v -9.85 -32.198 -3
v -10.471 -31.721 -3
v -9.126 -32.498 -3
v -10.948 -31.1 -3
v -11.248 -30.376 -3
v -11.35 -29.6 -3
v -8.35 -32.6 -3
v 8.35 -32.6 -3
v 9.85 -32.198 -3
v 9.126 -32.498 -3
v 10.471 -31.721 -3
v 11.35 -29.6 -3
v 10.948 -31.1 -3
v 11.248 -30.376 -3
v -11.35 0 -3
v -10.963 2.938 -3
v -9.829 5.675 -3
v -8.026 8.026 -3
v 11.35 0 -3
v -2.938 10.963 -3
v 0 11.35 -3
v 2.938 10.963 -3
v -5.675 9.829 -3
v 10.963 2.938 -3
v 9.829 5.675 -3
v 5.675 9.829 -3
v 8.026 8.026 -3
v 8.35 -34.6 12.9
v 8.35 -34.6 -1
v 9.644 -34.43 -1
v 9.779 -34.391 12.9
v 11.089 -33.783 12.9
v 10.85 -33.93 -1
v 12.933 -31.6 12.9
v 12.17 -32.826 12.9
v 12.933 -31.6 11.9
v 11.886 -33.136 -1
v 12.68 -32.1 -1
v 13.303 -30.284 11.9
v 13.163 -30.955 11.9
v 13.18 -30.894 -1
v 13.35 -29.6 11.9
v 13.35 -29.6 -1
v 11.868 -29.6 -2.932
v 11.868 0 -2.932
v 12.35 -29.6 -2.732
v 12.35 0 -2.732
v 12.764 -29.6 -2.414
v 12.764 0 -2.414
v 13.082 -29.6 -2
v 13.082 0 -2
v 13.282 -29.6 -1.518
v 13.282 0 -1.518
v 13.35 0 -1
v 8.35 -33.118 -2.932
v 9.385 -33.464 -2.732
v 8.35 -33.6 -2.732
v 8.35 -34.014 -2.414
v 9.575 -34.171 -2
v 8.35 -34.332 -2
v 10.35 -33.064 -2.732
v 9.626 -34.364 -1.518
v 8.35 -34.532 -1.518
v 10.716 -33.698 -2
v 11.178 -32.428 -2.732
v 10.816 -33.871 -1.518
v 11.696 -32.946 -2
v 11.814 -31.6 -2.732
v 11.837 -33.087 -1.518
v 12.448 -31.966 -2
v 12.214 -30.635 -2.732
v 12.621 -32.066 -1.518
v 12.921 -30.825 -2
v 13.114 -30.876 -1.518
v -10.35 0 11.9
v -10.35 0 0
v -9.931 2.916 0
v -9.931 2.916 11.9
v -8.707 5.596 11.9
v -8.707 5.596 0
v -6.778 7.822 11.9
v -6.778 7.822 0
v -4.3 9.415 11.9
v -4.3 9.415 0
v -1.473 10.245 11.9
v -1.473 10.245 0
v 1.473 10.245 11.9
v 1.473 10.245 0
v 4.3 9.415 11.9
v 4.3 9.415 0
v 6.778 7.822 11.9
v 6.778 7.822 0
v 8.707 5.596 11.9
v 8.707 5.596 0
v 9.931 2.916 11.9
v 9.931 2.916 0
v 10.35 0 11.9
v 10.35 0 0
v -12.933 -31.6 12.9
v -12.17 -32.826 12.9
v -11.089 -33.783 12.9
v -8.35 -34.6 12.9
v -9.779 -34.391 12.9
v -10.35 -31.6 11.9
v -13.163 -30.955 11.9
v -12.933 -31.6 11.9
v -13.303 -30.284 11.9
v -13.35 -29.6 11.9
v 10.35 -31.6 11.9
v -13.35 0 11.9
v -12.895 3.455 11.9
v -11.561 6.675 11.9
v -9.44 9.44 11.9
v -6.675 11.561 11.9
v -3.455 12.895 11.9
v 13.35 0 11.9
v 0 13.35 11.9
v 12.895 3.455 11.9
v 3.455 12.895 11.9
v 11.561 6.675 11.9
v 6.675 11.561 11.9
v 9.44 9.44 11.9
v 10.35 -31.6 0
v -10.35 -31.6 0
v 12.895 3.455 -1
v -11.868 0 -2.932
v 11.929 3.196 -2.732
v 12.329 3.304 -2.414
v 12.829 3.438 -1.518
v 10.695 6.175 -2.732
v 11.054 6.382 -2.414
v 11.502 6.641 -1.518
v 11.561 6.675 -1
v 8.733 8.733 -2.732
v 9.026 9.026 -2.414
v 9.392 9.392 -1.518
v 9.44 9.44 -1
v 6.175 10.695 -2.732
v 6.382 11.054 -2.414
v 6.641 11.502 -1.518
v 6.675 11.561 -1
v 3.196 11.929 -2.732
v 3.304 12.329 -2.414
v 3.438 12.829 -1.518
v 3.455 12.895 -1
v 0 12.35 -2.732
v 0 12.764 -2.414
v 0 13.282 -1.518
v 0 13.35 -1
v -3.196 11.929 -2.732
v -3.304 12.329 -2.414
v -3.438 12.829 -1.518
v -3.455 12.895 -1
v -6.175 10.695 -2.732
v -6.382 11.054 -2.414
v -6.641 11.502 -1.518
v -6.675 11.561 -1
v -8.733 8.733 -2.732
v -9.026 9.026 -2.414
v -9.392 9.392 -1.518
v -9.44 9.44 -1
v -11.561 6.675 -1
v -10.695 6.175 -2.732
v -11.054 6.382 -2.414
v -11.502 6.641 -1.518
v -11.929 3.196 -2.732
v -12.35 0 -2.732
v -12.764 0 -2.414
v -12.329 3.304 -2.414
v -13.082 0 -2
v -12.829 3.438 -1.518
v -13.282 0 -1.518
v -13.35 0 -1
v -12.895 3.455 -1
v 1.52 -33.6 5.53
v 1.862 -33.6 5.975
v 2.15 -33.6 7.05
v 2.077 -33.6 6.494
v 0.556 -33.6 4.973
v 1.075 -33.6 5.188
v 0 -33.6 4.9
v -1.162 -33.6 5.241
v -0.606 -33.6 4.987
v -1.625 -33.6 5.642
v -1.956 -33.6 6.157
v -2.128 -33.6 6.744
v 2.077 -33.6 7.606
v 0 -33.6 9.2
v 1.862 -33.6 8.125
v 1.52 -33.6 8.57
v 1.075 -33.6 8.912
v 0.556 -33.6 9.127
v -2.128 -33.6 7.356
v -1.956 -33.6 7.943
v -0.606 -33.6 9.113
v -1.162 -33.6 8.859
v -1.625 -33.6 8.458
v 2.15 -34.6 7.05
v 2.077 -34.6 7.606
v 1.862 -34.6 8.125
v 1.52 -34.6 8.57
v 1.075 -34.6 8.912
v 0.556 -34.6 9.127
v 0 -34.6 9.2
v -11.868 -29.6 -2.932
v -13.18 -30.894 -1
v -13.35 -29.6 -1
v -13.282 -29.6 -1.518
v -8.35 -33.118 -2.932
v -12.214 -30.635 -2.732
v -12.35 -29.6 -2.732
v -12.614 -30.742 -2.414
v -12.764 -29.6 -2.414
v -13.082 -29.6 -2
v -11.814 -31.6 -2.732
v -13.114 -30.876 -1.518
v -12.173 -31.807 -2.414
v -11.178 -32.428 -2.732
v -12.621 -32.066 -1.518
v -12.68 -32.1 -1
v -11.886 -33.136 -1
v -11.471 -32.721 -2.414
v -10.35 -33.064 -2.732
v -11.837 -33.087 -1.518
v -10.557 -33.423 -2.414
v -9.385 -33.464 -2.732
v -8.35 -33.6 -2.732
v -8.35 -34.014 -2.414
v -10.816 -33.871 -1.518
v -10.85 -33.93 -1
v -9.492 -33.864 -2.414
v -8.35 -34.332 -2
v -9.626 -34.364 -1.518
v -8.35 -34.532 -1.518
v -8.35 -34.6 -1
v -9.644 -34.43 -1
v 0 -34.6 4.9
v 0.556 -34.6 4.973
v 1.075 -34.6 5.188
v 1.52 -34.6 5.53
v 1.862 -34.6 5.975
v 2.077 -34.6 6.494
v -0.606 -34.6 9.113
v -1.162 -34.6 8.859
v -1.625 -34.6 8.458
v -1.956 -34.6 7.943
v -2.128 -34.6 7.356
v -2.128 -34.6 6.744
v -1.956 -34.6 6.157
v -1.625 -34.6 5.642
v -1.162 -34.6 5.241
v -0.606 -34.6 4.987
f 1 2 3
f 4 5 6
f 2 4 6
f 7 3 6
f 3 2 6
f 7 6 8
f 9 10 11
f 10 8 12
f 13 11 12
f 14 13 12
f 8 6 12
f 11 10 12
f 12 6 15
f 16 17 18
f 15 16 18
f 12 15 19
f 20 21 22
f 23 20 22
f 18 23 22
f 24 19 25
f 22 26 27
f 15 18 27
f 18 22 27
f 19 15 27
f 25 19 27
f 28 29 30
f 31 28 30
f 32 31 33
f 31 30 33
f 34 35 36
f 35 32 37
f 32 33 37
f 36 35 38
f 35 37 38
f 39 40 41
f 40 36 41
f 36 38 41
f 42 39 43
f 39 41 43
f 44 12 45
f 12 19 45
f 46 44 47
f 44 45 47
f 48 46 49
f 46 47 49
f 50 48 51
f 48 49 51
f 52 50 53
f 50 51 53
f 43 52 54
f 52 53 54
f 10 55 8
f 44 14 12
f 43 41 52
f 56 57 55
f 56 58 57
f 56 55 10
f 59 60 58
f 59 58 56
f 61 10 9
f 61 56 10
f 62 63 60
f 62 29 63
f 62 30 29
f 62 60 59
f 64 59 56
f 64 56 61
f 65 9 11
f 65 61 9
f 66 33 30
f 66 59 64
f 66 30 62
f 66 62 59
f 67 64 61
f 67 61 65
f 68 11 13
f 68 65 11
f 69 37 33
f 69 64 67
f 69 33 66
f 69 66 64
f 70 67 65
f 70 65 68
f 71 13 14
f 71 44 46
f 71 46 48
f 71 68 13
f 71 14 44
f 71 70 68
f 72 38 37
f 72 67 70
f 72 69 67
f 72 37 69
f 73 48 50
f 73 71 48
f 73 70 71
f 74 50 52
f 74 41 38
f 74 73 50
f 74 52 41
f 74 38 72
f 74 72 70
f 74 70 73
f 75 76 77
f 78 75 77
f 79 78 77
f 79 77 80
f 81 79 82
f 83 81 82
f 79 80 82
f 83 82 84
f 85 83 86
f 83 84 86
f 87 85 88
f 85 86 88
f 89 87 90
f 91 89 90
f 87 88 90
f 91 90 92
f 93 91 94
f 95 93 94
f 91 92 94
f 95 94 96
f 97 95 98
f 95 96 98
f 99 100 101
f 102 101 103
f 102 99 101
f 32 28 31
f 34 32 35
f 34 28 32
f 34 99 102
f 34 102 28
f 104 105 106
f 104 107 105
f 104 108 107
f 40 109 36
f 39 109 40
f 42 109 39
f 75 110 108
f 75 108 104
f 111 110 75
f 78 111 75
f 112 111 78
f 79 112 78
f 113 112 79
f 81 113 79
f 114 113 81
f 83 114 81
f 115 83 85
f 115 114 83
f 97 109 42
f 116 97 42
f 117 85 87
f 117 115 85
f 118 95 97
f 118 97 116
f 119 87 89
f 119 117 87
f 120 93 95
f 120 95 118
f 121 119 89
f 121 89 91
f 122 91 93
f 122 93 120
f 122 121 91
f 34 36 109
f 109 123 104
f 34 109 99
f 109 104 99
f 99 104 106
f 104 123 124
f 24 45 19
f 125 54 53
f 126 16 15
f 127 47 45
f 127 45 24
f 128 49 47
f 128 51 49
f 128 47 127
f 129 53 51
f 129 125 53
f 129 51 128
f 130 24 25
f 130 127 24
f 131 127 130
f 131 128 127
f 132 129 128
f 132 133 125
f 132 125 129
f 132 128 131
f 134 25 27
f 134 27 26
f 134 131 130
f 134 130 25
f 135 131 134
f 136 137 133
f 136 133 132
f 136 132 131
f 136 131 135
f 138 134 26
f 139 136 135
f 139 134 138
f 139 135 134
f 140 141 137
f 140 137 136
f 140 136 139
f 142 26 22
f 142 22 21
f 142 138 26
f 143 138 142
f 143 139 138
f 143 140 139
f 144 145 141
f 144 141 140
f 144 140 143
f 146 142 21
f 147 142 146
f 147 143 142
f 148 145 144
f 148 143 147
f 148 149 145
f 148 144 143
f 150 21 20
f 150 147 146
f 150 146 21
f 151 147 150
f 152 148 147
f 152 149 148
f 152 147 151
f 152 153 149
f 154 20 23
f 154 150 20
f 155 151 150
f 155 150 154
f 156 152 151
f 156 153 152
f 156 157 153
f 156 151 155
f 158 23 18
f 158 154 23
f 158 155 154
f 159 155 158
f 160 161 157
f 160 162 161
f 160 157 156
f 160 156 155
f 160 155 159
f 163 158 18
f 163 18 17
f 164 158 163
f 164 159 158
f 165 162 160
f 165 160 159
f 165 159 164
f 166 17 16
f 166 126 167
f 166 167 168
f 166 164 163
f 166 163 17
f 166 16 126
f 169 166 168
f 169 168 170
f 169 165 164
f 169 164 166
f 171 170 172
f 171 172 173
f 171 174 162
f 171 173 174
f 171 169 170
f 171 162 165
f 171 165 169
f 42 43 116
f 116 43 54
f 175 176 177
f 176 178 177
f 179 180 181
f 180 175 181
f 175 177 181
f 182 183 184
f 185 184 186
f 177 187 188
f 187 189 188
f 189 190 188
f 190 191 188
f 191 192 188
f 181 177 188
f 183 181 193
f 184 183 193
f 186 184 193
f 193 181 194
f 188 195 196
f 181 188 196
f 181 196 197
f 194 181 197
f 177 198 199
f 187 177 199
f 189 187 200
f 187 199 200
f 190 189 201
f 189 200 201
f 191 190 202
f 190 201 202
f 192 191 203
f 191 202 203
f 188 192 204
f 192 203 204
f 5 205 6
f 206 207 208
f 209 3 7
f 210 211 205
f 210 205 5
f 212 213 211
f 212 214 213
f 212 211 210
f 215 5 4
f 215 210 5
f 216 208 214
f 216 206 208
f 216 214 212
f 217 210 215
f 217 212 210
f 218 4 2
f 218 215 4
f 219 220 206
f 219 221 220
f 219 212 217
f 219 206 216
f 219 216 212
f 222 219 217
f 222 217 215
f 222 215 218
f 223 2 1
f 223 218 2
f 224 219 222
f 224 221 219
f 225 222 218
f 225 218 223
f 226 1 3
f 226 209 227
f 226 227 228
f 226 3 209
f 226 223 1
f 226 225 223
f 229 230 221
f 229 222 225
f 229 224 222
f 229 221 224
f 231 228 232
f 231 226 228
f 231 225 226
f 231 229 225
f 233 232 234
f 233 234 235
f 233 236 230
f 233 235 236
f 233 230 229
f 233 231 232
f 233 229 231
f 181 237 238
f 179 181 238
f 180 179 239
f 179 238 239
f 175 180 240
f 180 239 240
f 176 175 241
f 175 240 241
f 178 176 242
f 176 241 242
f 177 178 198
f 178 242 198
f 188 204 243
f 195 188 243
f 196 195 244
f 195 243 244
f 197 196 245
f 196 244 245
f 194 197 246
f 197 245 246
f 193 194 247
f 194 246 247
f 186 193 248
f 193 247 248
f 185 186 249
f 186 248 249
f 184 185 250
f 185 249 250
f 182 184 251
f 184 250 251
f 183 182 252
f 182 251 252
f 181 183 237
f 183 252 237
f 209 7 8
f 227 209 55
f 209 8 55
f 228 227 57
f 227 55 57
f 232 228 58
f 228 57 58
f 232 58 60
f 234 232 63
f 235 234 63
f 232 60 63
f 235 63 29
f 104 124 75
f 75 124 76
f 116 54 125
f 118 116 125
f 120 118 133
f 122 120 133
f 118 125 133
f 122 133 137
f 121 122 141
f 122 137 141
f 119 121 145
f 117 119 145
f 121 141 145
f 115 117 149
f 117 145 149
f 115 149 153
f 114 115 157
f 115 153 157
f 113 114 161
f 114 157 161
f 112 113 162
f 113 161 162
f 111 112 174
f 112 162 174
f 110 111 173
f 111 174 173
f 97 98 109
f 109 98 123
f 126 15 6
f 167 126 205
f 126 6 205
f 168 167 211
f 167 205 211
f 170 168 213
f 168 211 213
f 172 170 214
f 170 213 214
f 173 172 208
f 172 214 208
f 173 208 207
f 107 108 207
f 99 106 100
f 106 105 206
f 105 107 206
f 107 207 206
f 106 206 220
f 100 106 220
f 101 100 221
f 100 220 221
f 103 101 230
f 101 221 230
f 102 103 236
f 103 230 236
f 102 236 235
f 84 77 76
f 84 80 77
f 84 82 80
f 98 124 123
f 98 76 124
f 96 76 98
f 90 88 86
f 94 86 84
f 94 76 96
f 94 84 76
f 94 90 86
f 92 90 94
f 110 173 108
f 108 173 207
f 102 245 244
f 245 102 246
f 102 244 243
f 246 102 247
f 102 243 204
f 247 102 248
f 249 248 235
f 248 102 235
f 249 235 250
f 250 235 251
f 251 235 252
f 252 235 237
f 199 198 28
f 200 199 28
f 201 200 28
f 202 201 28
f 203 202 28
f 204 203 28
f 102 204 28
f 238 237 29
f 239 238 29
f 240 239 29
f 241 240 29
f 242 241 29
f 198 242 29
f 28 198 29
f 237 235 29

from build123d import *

# Parameters (mm, degrees)
F1_DEPTH    = 3
F2_DEPTH    = 11.9
F4_DEPTH    = 1
F6_DEPTH    = 6
F7_T1_DEPTH = 40.9
F8_R        = 2
F9_R        = 3.5272638361
F10_DEPTH   = 1
F11_DEPTH   = 1


# Not quite as in the source:
# - a fillet or chamfer that OpenCascade refuses, or shapes differently, is made with other operations: its cross-section is extruded or revolved along the edge and cut away or added


with BuildPart() as f1:
    # F0 (on Top) → F1 (new body)
    with BuildSketch(Plane.XY):
        with BuildLine():
            Line((13.35, -34.6), (13.35, 0))
            ThreePointArc((13.35, 0), (0, 13.35), (-13.35, 0))
            Line((-13.35, 0), (-13.35, -34.6))
            Line((-13.35, -34.6), (13.35, -34.6))
        make_face()
        with BuildLine():
            Line((-10.35, -31.6), (-10.35, 0))
            ThreePointArc((-10.35, 0), (0, 10.35), (10.35, 0))
            Line((10.35, 0), (10.35, -31.6))
            Line((10.35, -31.6), (-10.35, -31.6))
        make_face(mode=Mode.SUBTRACT)
        with BuildLine():
            ThreePointArc((10.35, 0), (0, 10.35), (-10.35, 0))
            Line((-10.35, 0), (-10.35, -31.6))
            Line((-10.35, -31.6), (10.35, -31.6))
            Line((10.35, -31.6), (10.35, 0))
        make_face()
    extrude(amount=-F1_DEPTH)

    # F0 (on Top) → F2 (join)
    with BuildSketch(Plane.XY):
        with BuildLine():
            Line((13.35, -34.6), (13.35, 0))
            ThreePointArc((13.35, 0), (0, 13.35), (-13.35, 0))
            Line((-13.35, 0), (-13.35, -34.6))
            Line((-13.35, -34.6), (13.35, -34.6))
        make_face()
        with BuildLine():
            Line((-10.35, -31.6), (-10.35, 0))
            ThreePointArc((-10.35, 0), (0, 10.35), (10.35, 0))
            Line((10.35, 0), (10.35, -31.6))
            Line((10.35, -31.6), (-10.35, -31.6))
        make_face(mode=Mode.SUBTRACT)
    extrude(amount=F2_DEPTH)

    # F3 (on face) → F4 (join)
    with BuildSketch(Plane.XY.offset(11.9)):
        Polygon((-13.35, -34.6), (13.35, -34.6), (13.35, -31.6), (10.35, -31.6), (-10.35, -31.6), (-13.35, -31.6), align=None)
    extrude(amount=F4_DEPTH)

    # F5 (on face) → F6 (cut)
    with BuildSketch(Plane.XZ.offset(34.6)):
        with BuildLine():
            ThreePointArc((0, 9.2), (-2.15, 7.05), (0, 4.9))
            Line((0, 4.9), (0, 9.2))
        make_face()
        with BuildLine():
            Line((0, 9.2), (0, 4.9))
            ThreePointArc((0, 4.9), (1.5202795796, 5.5297204204), (2.15, 7.05))
            ThreePointArc((2.15, 7.05), (1.5202795796, 8.5702795796), (0, 9.2))
        make_face()
    extrude(amount=-F6_DEPTH, mode=Mode.SUBTRACT)

    # F7: fillet of radius 5 on 2 edges, made by hand

    # F7_s2 → F7_t1 (cut)
    with BuildSketch(Plane.XY.offset(-15.5)):
        with BuildLine():
            ThreePointArc((-13.35, -29.6), (-11.8855339059, -33.1355339059), (-8.35, -34.6))
            Line((-8.35, -34.6), (-13.35, -34.6))
            Line((-13.35, -34.6), (-13.35, -29.6))
        make_face()
        with BuildLine():
            ThreePointArc((8.35, -34.6), (11.8855339059, -33.1355339059), (13.35, -29.6))
            Line((13.35, -29.6), (13.35, -34.6))
            Line((13.35, -34.6), (8.35, -34.6))
        make_face()
    extrude(amount=F7_T1_DEPTH, mode=Mode.SUBTRACT)

    # F8
    f8_edges = [f1.edges().sort_by_distance(p)[0] for p in [
        (13.35, -14.8, -3),
    ]]
    fillet(f8_edges, radius=F8_R)

    # F9 (on face) → F10 (join)
    with BuildSketch(Plane(origin=(0, -31.6, 0), x_dir=(-1, 0, 0), z_dir=(0, 1, 0))):
        with Locations((0, 7.05)):
            Circle(F9_R)
    extrude(amount=-F10_DEPTH)

    # F11 (add): a face of the model
    f11_faces = [f1.faces().sort_by_distance(p)[0] for p in [
        (0, -32.6, 7.05),
    ]]
    extrude(f11_faces, amount=F11_DEPTH)


solid = f1.part
